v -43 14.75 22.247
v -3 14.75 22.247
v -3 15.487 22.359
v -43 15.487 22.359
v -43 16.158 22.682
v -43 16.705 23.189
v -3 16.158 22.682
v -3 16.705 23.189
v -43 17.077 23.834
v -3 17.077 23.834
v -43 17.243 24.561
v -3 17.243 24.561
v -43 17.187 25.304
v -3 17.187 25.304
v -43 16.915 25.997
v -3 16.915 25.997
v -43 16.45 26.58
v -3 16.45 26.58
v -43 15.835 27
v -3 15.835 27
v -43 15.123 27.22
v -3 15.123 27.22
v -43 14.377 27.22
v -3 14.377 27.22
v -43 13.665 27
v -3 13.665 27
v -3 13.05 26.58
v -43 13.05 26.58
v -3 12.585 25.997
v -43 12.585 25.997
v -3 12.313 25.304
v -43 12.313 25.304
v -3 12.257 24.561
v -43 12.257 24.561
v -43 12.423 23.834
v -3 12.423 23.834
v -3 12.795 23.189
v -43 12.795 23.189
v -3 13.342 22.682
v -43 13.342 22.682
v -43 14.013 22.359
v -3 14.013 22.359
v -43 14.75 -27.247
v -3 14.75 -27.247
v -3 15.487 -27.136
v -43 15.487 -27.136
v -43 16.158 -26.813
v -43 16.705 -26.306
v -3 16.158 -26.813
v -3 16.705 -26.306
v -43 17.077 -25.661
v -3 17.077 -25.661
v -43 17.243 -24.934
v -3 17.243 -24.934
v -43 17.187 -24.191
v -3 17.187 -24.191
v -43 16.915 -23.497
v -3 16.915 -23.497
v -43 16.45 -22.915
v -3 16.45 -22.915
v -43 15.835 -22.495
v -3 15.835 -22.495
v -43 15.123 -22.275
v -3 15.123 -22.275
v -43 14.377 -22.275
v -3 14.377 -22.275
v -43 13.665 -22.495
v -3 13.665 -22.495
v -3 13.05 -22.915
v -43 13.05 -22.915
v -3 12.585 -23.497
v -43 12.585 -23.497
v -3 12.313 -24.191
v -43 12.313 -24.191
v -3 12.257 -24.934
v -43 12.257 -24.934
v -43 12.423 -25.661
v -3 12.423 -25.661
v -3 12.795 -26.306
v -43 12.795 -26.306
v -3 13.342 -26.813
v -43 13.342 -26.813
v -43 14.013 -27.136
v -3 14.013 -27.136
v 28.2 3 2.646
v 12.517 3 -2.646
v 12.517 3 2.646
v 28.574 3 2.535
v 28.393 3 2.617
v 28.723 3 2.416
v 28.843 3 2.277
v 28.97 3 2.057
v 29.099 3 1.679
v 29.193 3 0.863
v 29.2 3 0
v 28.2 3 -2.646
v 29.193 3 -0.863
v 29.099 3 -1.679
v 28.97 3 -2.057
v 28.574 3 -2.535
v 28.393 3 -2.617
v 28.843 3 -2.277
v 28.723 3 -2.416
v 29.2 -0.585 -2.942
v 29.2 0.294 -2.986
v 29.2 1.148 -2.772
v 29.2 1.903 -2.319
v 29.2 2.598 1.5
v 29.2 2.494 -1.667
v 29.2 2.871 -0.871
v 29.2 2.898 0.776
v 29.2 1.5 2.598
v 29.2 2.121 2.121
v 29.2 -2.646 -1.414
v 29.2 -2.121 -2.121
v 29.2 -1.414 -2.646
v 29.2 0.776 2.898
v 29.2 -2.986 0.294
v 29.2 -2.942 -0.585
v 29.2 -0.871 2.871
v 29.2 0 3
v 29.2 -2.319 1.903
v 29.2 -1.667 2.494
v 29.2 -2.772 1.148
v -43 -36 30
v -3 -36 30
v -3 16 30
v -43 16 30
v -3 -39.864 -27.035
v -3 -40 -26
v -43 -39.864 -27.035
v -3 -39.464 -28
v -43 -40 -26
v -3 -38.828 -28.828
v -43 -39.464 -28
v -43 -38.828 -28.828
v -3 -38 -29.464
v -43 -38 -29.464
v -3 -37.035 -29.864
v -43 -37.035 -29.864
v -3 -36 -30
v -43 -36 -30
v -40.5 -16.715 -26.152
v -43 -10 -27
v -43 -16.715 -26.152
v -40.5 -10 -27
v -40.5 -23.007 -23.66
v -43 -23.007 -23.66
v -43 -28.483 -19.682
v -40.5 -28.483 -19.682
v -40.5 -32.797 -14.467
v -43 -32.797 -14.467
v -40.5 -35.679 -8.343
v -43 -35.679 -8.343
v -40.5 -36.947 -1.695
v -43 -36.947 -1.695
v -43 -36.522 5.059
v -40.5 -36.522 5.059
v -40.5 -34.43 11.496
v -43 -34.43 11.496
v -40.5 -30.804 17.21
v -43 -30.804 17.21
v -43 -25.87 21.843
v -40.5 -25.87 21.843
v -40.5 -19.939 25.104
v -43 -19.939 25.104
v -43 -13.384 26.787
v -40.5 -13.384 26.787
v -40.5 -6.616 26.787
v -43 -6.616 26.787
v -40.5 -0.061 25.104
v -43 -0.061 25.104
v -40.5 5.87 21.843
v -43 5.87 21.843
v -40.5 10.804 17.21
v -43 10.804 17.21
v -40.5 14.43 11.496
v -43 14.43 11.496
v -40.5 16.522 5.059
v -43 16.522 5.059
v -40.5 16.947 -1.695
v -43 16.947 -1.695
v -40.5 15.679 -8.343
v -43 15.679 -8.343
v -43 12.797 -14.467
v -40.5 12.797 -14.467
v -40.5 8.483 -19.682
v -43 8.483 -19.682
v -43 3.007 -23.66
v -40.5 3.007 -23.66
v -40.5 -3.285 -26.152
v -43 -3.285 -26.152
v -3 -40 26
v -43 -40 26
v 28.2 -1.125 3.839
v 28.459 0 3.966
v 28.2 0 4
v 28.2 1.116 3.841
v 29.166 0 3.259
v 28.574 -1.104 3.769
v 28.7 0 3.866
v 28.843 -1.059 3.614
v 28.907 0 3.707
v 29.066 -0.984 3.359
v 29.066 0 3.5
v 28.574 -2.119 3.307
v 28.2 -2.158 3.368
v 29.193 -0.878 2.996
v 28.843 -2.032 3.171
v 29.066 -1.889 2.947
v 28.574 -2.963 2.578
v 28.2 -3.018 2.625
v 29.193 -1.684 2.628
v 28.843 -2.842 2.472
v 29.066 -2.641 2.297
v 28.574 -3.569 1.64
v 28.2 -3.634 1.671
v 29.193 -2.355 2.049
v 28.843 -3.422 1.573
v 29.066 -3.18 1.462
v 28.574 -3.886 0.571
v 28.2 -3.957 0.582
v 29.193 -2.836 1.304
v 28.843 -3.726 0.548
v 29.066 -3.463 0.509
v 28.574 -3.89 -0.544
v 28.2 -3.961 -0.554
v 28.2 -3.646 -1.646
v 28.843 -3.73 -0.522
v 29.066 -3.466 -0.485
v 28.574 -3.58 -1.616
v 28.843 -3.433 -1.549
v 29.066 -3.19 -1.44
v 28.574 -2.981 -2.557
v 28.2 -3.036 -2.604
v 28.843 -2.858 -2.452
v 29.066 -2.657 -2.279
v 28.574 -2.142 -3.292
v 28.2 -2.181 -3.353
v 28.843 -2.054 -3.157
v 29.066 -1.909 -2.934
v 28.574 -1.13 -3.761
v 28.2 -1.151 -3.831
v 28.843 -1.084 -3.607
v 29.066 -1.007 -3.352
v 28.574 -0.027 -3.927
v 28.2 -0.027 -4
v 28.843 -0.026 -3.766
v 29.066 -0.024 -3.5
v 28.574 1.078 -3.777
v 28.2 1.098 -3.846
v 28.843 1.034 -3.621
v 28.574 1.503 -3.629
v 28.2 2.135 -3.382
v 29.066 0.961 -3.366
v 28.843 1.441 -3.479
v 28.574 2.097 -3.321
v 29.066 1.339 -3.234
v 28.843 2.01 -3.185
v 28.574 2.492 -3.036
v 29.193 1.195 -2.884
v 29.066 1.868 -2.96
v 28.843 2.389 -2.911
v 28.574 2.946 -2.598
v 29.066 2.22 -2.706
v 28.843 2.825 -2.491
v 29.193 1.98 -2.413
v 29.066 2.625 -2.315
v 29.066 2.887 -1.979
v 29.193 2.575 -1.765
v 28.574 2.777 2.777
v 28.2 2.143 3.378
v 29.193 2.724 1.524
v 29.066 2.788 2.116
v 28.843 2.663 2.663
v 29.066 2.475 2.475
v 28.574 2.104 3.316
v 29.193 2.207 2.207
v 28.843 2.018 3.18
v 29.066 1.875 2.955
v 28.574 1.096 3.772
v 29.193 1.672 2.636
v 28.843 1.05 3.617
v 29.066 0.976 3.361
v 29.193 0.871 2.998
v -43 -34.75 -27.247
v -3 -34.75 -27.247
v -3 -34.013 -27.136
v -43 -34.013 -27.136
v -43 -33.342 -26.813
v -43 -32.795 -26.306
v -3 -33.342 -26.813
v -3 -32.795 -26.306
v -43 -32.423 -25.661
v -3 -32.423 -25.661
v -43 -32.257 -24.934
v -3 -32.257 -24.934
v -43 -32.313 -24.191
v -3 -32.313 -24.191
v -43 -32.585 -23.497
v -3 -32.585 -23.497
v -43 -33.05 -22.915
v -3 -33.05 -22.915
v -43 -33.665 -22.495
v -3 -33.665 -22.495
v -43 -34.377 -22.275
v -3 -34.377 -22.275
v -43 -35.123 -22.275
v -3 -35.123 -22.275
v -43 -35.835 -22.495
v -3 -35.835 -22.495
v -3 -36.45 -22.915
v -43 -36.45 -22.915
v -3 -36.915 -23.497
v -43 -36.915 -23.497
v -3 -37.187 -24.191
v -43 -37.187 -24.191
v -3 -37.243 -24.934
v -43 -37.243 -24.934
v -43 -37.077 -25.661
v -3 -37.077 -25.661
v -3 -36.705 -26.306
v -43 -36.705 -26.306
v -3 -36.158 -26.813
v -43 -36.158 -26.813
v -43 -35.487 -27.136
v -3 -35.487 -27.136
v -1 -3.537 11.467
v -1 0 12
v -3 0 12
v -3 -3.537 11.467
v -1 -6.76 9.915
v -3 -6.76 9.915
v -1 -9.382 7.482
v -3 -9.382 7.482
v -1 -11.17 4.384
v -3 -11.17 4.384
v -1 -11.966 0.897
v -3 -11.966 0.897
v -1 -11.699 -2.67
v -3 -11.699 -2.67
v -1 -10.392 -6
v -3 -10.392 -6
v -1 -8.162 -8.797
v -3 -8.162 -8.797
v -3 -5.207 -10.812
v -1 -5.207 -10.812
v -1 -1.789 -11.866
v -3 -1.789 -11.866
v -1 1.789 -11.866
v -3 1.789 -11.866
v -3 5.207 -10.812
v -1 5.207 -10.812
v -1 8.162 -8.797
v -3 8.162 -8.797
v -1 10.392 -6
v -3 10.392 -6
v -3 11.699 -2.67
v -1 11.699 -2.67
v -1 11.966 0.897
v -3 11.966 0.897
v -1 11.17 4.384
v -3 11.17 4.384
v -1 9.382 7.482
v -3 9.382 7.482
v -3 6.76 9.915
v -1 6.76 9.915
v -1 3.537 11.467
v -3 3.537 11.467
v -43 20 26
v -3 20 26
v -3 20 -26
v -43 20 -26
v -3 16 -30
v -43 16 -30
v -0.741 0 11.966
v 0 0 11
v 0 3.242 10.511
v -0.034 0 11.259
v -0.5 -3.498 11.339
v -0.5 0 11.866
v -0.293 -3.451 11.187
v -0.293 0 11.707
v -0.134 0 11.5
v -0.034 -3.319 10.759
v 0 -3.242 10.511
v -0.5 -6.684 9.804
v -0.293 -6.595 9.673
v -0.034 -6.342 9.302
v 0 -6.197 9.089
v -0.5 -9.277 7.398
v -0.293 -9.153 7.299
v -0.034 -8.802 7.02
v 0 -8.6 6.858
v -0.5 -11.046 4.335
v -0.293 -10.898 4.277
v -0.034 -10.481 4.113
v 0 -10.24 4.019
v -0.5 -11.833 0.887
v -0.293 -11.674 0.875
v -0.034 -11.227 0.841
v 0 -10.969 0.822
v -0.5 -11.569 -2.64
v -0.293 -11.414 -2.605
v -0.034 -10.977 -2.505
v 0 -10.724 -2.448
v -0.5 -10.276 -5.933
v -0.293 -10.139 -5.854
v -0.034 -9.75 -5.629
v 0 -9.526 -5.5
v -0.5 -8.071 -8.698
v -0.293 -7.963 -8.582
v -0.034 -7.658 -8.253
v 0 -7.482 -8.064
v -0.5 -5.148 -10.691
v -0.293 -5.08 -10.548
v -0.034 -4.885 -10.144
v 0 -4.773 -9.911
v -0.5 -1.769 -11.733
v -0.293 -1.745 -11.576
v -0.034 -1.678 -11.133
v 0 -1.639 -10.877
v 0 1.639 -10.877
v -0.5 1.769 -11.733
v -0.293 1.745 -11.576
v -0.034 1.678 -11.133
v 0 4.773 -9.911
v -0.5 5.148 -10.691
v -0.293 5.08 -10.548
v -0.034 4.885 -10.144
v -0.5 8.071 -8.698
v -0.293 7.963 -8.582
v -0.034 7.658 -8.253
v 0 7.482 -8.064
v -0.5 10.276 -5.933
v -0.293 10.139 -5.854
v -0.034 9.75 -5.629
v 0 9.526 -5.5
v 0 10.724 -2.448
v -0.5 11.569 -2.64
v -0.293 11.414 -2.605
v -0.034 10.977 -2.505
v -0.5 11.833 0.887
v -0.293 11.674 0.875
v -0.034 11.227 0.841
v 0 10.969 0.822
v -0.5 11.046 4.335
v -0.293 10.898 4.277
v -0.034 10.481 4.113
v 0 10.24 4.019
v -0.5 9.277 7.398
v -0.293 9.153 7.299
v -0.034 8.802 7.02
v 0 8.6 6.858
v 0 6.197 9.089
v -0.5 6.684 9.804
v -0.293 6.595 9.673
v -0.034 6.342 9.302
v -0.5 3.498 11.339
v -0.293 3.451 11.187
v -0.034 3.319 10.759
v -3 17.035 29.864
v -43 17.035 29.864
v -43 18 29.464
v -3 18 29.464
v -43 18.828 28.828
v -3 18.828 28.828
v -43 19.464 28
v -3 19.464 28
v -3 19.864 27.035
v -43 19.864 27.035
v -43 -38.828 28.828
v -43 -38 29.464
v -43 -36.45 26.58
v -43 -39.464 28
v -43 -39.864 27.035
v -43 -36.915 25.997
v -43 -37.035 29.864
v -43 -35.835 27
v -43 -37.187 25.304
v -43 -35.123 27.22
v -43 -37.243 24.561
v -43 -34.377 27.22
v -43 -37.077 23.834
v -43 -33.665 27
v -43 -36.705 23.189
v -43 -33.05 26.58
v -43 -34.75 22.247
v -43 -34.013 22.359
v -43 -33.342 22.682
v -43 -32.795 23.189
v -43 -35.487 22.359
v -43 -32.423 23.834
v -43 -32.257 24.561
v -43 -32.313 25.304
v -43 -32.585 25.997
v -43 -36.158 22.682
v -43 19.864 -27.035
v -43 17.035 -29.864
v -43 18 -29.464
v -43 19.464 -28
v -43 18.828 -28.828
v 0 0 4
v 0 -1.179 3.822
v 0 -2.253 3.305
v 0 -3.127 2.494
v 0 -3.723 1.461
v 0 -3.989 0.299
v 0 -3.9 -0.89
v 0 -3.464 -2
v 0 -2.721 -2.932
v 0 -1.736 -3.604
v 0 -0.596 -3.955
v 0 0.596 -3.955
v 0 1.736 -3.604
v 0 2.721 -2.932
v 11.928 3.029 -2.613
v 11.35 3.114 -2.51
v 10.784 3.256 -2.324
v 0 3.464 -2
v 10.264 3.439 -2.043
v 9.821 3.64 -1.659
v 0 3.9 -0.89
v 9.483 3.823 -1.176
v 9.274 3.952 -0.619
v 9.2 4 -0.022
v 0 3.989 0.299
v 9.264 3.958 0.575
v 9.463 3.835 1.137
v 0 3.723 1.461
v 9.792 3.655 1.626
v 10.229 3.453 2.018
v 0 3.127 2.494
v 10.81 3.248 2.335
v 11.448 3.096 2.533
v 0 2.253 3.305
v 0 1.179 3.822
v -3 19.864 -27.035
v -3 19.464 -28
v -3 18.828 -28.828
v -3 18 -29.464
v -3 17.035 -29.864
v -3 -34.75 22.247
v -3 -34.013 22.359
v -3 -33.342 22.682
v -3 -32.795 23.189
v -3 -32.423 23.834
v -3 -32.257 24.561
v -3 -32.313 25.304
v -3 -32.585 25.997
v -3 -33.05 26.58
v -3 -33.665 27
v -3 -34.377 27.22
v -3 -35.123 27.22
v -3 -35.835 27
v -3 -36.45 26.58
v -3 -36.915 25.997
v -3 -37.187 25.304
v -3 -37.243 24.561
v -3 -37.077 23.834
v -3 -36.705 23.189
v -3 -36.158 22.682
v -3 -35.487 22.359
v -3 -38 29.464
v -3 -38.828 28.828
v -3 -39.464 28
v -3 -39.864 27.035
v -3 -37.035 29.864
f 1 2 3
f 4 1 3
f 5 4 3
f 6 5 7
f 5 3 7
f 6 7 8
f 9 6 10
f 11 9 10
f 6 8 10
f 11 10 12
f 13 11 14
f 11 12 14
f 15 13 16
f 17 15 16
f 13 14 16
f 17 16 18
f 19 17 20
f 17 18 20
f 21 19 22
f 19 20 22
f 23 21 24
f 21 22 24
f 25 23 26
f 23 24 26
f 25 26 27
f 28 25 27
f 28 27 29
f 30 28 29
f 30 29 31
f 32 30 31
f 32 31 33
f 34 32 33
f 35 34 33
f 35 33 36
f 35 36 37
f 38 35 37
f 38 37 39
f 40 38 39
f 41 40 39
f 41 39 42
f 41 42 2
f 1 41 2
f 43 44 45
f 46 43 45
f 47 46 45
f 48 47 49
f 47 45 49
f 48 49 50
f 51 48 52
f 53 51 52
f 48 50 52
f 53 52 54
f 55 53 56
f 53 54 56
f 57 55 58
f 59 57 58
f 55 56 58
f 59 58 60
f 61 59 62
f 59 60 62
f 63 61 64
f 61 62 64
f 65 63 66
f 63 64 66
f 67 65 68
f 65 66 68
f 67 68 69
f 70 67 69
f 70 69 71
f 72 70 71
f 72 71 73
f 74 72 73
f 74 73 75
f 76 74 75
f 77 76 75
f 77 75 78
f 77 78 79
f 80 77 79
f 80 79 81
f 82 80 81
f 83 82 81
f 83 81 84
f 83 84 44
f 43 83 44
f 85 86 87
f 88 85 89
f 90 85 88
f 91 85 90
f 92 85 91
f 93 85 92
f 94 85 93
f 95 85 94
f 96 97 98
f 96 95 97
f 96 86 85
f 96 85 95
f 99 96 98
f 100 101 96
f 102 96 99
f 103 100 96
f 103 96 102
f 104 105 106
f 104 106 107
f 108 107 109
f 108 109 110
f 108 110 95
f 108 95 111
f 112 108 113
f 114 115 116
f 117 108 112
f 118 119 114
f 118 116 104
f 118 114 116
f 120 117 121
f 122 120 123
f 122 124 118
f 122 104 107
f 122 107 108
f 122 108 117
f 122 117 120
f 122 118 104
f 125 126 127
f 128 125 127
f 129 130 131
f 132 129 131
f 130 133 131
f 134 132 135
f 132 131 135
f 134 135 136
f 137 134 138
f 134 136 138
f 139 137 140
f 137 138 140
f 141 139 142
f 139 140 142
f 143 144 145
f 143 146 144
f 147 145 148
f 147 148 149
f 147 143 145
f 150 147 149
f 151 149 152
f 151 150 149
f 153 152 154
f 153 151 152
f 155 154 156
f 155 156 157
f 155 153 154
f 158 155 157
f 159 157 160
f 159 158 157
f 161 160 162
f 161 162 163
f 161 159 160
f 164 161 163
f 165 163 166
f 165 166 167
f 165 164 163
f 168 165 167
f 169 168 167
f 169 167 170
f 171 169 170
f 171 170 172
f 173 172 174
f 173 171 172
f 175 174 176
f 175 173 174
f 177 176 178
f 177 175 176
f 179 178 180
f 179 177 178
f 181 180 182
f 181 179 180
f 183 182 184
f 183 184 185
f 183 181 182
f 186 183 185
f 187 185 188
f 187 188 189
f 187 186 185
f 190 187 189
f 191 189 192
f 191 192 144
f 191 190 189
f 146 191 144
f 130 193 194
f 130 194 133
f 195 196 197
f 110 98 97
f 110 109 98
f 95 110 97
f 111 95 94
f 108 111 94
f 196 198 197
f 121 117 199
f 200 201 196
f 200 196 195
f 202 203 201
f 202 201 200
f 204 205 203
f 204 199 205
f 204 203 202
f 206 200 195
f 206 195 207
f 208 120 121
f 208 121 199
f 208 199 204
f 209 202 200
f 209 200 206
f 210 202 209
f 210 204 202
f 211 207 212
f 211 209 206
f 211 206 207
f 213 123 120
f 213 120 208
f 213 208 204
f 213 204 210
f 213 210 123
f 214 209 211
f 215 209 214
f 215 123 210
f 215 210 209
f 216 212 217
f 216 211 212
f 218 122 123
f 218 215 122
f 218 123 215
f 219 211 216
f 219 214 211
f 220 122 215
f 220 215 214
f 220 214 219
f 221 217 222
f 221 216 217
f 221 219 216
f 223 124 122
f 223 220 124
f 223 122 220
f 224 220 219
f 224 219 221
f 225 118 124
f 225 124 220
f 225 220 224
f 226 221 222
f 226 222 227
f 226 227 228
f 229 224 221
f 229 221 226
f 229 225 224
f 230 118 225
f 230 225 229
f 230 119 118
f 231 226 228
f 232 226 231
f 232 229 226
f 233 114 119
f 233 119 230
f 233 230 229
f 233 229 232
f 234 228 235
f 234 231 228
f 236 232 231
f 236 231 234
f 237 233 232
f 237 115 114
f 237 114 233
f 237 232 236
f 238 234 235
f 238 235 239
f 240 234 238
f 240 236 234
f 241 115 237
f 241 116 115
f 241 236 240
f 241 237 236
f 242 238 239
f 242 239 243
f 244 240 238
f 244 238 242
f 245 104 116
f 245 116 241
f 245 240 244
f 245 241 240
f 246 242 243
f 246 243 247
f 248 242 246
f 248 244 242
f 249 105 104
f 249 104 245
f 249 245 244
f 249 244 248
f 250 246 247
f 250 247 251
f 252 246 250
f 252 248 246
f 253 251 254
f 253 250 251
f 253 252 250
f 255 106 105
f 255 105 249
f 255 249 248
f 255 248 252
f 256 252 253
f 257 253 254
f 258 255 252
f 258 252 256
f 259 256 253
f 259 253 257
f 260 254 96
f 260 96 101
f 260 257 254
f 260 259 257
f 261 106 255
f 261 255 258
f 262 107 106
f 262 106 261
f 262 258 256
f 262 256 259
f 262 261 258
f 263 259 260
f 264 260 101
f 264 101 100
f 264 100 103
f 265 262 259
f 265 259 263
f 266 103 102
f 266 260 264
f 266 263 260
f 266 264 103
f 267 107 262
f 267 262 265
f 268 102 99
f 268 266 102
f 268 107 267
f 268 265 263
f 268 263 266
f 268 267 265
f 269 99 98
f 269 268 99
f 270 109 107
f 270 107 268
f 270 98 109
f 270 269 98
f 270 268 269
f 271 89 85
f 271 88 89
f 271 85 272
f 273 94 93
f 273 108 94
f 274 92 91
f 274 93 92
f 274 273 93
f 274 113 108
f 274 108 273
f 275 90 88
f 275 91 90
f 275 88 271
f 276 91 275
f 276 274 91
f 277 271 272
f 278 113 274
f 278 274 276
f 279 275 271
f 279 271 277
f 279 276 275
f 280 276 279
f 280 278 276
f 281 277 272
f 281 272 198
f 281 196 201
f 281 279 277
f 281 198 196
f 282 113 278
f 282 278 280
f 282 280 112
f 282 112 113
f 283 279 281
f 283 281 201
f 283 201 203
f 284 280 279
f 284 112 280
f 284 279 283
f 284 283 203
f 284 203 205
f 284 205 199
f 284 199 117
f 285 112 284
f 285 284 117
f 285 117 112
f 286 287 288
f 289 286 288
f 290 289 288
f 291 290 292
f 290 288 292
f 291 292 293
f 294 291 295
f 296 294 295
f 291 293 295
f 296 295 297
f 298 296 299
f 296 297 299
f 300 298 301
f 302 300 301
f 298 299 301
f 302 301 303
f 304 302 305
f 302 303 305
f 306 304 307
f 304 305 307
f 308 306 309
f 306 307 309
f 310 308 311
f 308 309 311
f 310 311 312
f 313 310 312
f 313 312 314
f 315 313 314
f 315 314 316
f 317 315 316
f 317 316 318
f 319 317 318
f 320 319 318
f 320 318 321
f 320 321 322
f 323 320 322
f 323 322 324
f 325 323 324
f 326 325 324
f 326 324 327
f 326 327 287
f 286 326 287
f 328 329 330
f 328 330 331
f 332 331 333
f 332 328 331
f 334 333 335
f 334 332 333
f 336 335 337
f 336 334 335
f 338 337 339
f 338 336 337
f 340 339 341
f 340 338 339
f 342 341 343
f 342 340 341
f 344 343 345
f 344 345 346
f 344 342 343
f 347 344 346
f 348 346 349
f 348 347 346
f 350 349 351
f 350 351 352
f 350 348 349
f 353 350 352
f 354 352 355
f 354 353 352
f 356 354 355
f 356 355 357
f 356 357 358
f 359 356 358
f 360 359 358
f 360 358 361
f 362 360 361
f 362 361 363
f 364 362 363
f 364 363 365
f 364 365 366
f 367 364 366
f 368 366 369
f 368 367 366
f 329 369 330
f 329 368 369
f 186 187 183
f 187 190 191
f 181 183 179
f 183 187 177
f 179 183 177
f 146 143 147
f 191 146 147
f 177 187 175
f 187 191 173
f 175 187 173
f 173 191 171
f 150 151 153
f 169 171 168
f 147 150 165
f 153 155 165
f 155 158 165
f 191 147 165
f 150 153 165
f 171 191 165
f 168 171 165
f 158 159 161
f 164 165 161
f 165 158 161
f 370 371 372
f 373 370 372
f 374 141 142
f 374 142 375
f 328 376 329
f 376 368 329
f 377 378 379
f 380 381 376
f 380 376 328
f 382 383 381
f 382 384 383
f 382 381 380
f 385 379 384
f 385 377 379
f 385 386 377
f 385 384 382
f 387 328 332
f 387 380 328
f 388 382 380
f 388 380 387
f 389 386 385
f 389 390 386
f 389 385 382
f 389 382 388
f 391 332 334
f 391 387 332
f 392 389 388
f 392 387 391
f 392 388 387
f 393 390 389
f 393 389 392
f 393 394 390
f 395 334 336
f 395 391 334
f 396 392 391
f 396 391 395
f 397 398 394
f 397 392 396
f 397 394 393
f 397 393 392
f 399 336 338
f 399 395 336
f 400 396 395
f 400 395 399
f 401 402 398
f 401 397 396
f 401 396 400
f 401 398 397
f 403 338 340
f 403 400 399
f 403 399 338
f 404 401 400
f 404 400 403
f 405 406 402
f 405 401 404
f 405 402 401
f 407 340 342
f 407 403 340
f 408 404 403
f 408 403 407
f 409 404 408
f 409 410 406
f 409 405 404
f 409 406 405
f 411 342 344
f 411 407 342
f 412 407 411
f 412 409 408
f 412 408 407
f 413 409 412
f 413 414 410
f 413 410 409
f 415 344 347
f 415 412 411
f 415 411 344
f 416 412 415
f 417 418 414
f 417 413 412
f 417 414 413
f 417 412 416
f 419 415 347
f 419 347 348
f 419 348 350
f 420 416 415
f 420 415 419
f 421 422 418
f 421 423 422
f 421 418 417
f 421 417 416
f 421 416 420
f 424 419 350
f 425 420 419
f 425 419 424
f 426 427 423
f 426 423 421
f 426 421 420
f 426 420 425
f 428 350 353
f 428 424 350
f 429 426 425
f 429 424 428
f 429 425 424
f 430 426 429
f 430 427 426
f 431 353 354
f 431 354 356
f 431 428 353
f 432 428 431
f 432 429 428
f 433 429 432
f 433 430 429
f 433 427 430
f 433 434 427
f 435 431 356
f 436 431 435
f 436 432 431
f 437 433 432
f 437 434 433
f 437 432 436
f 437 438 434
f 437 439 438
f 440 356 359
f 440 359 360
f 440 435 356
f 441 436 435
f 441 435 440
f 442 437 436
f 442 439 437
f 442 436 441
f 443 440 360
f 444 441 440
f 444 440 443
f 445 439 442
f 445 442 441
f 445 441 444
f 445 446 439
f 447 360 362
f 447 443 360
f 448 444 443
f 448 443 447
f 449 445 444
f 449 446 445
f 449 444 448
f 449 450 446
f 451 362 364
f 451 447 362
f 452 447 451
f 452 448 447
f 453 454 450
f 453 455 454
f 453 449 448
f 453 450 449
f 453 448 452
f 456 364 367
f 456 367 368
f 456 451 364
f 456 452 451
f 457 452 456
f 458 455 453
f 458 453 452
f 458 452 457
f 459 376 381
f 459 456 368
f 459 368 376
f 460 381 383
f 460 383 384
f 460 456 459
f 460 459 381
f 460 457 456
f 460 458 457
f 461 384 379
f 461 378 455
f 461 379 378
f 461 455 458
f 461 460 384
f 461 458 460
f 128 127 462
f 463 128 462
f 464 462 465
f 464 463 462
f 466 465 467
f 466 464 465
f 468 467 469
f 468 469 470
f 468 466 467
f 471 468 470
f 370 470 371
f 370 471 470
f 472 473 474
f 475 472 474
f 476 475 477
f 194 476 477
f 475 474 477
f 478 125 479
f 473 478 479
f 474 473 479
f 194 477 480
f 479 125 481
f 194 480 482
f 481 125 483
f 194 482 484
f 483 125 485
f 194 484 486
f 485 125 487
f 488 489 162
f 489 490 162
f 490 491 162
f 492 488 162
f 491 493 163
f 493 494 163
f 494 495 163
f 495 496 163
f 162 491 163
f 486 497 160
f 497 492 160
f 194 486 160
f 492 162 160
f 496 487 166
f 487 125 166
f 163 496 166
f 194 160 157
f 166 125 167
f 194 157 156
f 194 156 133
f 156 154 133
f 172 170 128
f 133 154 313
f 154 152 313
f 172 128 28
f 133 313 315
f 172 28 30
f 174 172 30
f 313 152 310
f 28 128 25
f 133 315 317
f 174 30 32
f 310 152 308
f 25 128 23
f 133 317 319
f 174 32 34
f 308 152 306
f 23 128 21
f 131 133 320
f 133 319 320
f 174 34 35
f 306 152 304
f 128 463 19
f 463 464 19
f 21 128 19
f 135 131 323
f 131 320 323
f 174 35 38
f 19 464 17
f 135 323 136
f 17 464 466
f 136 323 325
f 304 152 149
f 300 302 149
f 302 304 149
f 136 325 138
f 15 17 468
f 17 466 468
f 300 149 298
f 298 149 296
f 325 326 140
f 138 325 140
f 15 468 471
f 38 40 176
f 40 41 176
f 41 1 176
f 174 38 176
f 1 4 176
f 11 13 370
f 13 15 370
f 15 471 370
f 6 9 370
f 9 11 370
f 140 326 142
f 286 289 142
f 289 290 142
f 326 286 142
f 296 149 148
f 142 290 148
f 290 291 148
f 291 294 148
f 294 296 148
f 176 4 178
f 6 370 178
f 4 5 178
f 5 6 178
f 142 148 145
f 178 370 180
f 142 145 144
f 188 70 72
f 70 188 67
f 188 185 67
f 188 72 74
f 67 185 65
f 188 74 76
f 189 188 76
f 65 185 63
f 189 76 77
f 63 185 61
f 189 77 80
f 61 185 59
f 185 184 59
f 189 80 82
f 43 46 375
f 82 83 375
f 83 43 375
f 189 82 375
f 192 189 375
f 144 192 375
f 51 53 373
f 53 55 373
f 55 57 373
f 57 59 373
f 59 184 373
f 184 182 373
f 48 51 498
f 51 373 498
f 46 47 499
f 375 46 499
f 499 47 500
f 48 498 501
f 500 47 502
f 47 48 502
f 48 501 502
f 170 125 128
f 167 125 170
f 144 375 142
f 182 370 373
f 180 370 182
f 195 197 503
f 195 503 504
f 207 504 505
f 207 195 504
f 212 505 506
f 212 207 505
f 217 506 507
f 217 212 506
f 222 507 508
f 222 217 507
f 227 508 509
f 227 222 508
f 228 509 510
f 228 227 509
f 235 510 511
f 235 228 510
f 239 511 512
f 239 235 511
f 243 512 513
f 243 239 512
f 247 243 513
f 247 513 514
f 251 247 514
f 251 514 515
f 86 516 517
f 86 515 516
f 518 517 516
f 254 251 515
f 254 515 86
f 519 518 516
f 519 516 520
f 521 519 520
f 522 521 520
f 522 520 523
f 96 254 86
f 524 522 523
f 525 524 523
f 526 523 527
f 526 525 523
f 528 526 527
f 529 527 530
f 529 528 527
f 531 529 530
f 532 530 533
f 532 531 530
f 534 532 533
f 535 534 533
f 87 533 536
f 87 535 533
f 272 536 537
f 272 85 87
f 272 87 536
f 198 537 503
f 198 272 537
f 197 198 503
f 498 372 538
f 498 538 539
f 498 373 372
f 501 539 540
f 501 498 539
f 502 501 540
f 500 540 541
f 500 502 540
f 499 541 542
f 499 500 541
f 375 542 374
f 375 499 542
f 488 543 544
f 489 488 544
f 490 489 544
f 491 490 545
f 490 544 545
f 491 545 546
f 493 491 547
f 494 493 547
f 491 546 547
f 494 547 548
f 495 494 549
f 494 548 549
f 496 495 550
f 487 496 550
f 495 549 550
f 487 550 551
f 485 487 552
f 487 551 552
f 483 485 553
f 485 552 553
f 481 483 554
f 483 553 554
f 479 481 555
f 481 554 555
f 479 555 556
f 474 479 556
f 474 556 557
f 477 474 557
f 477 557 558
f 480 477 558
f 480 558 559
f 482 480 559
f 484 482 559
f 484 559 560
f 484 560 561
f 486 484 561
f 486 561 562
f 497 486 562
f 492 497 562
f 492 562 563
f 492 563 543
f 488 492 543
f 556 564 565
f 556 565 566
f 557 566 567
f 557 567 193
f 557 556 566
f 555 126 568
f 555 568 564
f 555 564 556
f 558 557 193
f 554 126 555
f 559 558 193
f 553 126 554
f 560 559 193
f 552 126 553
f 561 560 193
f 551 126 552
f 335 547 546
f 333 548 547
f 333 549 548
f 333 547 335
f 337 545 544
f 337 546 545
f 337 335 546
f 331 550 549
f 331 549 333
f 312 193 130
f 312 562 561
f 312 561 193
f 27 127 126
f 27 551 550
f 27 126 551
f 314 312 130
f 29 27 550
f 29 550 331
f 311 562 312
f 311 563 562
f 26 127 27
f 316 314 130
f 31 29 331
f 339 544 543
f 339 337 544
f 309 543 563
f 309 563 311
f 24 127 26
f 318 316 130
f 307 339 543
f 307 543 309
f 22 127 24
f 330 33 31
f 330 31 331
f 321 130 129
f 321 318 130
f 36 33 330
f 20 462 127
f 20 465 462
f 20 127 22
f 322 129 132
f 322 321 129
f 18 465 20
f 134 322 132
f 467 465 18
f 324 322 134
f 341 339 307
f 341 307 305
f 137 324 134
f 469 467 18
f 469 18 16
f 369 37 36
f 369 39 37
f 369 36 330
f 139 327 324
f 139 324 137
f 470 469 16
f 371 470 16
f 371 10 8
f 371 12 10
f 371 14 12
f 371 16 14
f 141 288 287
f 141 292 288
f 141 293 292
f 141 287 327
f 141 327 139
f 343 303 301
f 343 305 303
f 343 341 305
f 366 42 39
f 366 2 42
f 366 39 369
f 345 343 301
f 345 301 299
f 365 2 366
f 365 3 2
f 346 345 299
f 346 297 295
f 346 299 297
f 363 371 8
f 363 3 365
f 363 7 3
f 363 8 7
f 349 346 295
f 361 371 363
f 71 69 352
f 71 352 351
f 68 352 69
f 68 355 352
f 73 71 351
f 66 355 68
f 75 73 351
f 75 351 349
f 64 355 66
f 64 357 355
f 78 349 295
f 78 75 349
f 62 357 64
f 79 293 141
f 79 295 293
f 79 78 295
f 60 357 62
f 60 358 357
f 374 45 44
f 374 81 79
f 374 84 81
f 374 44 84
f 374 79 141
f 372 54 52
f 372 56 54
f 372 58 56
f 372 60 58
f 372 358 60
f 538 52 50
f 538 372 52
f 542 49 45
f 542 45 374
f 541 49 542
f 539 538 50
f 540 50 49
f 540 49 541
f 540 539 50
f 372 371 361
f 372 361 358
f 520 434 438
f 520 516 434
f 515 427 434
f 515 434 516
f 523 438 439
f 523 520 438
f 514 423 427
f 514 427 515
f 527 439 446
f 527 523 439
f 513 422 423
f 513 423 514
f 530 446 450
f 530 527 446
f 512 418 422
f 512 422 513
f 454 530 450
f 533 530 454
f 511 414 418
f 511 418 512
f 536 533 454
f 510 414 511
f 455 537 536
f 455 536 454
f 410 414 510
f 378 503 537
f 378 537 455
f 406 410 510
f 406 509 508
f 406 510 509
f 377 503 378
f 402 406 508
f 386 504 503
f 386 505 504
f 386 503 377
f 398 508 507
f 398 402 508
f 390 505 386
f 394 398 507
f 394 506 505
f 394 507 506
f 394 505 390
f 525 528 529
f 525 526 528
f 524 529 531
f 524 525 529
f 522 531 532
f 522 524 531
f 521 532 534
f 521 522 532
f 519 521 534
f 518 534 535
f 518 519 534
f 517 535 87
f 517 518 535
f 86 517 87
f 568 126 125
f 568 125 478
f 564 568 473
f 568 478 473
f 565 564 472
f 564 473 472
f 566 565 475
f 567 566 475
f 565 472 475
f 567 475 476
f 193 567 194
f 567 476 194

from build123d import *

# Parameters (mm, degrees)
SKETCH1_W               = 60
SKETCH1_H               = 60
BOSS_EXTRUDE1_DEPTH     = 40
SKETCH2_R               = 2.5
CUT_EXTRUDE1_DEPTH      = 65.031242374
FILLET1_R               = 4
FILLET2_R               = 1
CUT_EXTRUDE2_DEPTH      = 66.946948375
CUT_EXTRUDE2_DEPTH_BACK = 66.946948375
SKETCH5_W               = 2.5
SKETCH5_H               = 27


with BuildPart() as part:
    # Sketch1 → Boss-Extrude1 (new body)
    with BuildSketch(Plane(origin=(-3, 0, 0), x_dir=(0, 0, -1), z_dir=(1, 0, 0))):
        with Locations((0, -10)):
            Rectangle(SKETCH1_W, SKETCH1_H)
    extrude(amount=-BOSS_EXTRUDE1_DEPTH)

    # Sketch2 → Cut-Extrude1 (cut, through all)
    with BuildSketch(Plane(origin=(-3, 0, 0), x_dir=(0, 0, -1), z_dir=(1, 0, 0))):
        with Locations((-24.747474619, 14.75)):
            Circle(SKETCH2_R)
        with Locations((24.747474619, 14.75)):
            Circle(SKETCH2_R)
        with Locations((24.747474619, -34.75)):
            Circle(SKETCH2_R)
        with Locations((-24.747474619, -34.75)):
            Circle(SKETCH2_R)
    extrude(amount=-CUT_EXTRUDE1_DEPTH, mode=Mode.SUBTRACT)

    # Fillet1
    fillet1_edges = [part.edges().sort_by_distance(p)[0] for p in [
        (-23, 20, 30),
        (-23, 20, -30),
        (-23, -40, -30),
        (-23, -40, 30),
    ]]
    fillet(fillet1_edges, radius=FILLET1_R)

    # Sketch3 → Revolve1 (revolve)
    with BuildSketch(Plane.XY, mode=Mode.PRIVATE) as revolve1_sk:
        Polygon((-3, 12), (0, 12), (0, 4), (29.2, 4), (29.2, 0), (-3, 0), align=None)
    revolve(revolve1_sk.sketch.rotate(Axis((-3, 0, 0), (1, 0, 0)), 90), axis=Axis((-3, 0, 0), (1, 0, 0)))

    # Fillet2
    fillet2_edges = [part.edges().sort_by_distance(p)[0] for p in [
        (0, 0, -12),
        (29.2, 0, -4),
    ]]
    fillet(fillet2_edges, radius=FILLET2_R)

    # Sketch4 → Cut-Extrude2 (cut, two sides: drawn at the far end of the back side and taken through both)
    with BuildSketch(Plane.XY.offset(-CUT_EXTRUDE2_DEPTH_BACK)):
        with BuildLine():
            Line((29.2, 4), (9.2, 4))
            ThreePointArc((9.2, 4), (10.784573983, 3.255437353), (12.51662479, 3))
            Line((12.51662479, 3), (29.2, 3))
            Line((29.2, 3), (29.2, 4))
        make_face()
    extrude(amount=CUT_EXTRUDE2_DEPTH + CUT_EXTRUDE2_DEPTH_BACK, mode=Mode.SUBTRACT)

    # Sketch5 → Cut-Revolve1 (revolve, cut)
    with BuildSketch(Plane.XY, mode=Mode.PRIVATE) as cut_revolve1_sk:
        with Locations((-41.75, 3.5)):
            Rectangle(SKETCH5_W, SKETCH5_H)
    revolve(cut_revolve1_sk.sketch.rotate(Axis((-40.5, -10, 0), (-1, 0, 0)), 90), axis=Axis((-40.5, -10, 0), (-1, 0, 0)), mode=Mode.SUBTRACT)


solid = part.part
